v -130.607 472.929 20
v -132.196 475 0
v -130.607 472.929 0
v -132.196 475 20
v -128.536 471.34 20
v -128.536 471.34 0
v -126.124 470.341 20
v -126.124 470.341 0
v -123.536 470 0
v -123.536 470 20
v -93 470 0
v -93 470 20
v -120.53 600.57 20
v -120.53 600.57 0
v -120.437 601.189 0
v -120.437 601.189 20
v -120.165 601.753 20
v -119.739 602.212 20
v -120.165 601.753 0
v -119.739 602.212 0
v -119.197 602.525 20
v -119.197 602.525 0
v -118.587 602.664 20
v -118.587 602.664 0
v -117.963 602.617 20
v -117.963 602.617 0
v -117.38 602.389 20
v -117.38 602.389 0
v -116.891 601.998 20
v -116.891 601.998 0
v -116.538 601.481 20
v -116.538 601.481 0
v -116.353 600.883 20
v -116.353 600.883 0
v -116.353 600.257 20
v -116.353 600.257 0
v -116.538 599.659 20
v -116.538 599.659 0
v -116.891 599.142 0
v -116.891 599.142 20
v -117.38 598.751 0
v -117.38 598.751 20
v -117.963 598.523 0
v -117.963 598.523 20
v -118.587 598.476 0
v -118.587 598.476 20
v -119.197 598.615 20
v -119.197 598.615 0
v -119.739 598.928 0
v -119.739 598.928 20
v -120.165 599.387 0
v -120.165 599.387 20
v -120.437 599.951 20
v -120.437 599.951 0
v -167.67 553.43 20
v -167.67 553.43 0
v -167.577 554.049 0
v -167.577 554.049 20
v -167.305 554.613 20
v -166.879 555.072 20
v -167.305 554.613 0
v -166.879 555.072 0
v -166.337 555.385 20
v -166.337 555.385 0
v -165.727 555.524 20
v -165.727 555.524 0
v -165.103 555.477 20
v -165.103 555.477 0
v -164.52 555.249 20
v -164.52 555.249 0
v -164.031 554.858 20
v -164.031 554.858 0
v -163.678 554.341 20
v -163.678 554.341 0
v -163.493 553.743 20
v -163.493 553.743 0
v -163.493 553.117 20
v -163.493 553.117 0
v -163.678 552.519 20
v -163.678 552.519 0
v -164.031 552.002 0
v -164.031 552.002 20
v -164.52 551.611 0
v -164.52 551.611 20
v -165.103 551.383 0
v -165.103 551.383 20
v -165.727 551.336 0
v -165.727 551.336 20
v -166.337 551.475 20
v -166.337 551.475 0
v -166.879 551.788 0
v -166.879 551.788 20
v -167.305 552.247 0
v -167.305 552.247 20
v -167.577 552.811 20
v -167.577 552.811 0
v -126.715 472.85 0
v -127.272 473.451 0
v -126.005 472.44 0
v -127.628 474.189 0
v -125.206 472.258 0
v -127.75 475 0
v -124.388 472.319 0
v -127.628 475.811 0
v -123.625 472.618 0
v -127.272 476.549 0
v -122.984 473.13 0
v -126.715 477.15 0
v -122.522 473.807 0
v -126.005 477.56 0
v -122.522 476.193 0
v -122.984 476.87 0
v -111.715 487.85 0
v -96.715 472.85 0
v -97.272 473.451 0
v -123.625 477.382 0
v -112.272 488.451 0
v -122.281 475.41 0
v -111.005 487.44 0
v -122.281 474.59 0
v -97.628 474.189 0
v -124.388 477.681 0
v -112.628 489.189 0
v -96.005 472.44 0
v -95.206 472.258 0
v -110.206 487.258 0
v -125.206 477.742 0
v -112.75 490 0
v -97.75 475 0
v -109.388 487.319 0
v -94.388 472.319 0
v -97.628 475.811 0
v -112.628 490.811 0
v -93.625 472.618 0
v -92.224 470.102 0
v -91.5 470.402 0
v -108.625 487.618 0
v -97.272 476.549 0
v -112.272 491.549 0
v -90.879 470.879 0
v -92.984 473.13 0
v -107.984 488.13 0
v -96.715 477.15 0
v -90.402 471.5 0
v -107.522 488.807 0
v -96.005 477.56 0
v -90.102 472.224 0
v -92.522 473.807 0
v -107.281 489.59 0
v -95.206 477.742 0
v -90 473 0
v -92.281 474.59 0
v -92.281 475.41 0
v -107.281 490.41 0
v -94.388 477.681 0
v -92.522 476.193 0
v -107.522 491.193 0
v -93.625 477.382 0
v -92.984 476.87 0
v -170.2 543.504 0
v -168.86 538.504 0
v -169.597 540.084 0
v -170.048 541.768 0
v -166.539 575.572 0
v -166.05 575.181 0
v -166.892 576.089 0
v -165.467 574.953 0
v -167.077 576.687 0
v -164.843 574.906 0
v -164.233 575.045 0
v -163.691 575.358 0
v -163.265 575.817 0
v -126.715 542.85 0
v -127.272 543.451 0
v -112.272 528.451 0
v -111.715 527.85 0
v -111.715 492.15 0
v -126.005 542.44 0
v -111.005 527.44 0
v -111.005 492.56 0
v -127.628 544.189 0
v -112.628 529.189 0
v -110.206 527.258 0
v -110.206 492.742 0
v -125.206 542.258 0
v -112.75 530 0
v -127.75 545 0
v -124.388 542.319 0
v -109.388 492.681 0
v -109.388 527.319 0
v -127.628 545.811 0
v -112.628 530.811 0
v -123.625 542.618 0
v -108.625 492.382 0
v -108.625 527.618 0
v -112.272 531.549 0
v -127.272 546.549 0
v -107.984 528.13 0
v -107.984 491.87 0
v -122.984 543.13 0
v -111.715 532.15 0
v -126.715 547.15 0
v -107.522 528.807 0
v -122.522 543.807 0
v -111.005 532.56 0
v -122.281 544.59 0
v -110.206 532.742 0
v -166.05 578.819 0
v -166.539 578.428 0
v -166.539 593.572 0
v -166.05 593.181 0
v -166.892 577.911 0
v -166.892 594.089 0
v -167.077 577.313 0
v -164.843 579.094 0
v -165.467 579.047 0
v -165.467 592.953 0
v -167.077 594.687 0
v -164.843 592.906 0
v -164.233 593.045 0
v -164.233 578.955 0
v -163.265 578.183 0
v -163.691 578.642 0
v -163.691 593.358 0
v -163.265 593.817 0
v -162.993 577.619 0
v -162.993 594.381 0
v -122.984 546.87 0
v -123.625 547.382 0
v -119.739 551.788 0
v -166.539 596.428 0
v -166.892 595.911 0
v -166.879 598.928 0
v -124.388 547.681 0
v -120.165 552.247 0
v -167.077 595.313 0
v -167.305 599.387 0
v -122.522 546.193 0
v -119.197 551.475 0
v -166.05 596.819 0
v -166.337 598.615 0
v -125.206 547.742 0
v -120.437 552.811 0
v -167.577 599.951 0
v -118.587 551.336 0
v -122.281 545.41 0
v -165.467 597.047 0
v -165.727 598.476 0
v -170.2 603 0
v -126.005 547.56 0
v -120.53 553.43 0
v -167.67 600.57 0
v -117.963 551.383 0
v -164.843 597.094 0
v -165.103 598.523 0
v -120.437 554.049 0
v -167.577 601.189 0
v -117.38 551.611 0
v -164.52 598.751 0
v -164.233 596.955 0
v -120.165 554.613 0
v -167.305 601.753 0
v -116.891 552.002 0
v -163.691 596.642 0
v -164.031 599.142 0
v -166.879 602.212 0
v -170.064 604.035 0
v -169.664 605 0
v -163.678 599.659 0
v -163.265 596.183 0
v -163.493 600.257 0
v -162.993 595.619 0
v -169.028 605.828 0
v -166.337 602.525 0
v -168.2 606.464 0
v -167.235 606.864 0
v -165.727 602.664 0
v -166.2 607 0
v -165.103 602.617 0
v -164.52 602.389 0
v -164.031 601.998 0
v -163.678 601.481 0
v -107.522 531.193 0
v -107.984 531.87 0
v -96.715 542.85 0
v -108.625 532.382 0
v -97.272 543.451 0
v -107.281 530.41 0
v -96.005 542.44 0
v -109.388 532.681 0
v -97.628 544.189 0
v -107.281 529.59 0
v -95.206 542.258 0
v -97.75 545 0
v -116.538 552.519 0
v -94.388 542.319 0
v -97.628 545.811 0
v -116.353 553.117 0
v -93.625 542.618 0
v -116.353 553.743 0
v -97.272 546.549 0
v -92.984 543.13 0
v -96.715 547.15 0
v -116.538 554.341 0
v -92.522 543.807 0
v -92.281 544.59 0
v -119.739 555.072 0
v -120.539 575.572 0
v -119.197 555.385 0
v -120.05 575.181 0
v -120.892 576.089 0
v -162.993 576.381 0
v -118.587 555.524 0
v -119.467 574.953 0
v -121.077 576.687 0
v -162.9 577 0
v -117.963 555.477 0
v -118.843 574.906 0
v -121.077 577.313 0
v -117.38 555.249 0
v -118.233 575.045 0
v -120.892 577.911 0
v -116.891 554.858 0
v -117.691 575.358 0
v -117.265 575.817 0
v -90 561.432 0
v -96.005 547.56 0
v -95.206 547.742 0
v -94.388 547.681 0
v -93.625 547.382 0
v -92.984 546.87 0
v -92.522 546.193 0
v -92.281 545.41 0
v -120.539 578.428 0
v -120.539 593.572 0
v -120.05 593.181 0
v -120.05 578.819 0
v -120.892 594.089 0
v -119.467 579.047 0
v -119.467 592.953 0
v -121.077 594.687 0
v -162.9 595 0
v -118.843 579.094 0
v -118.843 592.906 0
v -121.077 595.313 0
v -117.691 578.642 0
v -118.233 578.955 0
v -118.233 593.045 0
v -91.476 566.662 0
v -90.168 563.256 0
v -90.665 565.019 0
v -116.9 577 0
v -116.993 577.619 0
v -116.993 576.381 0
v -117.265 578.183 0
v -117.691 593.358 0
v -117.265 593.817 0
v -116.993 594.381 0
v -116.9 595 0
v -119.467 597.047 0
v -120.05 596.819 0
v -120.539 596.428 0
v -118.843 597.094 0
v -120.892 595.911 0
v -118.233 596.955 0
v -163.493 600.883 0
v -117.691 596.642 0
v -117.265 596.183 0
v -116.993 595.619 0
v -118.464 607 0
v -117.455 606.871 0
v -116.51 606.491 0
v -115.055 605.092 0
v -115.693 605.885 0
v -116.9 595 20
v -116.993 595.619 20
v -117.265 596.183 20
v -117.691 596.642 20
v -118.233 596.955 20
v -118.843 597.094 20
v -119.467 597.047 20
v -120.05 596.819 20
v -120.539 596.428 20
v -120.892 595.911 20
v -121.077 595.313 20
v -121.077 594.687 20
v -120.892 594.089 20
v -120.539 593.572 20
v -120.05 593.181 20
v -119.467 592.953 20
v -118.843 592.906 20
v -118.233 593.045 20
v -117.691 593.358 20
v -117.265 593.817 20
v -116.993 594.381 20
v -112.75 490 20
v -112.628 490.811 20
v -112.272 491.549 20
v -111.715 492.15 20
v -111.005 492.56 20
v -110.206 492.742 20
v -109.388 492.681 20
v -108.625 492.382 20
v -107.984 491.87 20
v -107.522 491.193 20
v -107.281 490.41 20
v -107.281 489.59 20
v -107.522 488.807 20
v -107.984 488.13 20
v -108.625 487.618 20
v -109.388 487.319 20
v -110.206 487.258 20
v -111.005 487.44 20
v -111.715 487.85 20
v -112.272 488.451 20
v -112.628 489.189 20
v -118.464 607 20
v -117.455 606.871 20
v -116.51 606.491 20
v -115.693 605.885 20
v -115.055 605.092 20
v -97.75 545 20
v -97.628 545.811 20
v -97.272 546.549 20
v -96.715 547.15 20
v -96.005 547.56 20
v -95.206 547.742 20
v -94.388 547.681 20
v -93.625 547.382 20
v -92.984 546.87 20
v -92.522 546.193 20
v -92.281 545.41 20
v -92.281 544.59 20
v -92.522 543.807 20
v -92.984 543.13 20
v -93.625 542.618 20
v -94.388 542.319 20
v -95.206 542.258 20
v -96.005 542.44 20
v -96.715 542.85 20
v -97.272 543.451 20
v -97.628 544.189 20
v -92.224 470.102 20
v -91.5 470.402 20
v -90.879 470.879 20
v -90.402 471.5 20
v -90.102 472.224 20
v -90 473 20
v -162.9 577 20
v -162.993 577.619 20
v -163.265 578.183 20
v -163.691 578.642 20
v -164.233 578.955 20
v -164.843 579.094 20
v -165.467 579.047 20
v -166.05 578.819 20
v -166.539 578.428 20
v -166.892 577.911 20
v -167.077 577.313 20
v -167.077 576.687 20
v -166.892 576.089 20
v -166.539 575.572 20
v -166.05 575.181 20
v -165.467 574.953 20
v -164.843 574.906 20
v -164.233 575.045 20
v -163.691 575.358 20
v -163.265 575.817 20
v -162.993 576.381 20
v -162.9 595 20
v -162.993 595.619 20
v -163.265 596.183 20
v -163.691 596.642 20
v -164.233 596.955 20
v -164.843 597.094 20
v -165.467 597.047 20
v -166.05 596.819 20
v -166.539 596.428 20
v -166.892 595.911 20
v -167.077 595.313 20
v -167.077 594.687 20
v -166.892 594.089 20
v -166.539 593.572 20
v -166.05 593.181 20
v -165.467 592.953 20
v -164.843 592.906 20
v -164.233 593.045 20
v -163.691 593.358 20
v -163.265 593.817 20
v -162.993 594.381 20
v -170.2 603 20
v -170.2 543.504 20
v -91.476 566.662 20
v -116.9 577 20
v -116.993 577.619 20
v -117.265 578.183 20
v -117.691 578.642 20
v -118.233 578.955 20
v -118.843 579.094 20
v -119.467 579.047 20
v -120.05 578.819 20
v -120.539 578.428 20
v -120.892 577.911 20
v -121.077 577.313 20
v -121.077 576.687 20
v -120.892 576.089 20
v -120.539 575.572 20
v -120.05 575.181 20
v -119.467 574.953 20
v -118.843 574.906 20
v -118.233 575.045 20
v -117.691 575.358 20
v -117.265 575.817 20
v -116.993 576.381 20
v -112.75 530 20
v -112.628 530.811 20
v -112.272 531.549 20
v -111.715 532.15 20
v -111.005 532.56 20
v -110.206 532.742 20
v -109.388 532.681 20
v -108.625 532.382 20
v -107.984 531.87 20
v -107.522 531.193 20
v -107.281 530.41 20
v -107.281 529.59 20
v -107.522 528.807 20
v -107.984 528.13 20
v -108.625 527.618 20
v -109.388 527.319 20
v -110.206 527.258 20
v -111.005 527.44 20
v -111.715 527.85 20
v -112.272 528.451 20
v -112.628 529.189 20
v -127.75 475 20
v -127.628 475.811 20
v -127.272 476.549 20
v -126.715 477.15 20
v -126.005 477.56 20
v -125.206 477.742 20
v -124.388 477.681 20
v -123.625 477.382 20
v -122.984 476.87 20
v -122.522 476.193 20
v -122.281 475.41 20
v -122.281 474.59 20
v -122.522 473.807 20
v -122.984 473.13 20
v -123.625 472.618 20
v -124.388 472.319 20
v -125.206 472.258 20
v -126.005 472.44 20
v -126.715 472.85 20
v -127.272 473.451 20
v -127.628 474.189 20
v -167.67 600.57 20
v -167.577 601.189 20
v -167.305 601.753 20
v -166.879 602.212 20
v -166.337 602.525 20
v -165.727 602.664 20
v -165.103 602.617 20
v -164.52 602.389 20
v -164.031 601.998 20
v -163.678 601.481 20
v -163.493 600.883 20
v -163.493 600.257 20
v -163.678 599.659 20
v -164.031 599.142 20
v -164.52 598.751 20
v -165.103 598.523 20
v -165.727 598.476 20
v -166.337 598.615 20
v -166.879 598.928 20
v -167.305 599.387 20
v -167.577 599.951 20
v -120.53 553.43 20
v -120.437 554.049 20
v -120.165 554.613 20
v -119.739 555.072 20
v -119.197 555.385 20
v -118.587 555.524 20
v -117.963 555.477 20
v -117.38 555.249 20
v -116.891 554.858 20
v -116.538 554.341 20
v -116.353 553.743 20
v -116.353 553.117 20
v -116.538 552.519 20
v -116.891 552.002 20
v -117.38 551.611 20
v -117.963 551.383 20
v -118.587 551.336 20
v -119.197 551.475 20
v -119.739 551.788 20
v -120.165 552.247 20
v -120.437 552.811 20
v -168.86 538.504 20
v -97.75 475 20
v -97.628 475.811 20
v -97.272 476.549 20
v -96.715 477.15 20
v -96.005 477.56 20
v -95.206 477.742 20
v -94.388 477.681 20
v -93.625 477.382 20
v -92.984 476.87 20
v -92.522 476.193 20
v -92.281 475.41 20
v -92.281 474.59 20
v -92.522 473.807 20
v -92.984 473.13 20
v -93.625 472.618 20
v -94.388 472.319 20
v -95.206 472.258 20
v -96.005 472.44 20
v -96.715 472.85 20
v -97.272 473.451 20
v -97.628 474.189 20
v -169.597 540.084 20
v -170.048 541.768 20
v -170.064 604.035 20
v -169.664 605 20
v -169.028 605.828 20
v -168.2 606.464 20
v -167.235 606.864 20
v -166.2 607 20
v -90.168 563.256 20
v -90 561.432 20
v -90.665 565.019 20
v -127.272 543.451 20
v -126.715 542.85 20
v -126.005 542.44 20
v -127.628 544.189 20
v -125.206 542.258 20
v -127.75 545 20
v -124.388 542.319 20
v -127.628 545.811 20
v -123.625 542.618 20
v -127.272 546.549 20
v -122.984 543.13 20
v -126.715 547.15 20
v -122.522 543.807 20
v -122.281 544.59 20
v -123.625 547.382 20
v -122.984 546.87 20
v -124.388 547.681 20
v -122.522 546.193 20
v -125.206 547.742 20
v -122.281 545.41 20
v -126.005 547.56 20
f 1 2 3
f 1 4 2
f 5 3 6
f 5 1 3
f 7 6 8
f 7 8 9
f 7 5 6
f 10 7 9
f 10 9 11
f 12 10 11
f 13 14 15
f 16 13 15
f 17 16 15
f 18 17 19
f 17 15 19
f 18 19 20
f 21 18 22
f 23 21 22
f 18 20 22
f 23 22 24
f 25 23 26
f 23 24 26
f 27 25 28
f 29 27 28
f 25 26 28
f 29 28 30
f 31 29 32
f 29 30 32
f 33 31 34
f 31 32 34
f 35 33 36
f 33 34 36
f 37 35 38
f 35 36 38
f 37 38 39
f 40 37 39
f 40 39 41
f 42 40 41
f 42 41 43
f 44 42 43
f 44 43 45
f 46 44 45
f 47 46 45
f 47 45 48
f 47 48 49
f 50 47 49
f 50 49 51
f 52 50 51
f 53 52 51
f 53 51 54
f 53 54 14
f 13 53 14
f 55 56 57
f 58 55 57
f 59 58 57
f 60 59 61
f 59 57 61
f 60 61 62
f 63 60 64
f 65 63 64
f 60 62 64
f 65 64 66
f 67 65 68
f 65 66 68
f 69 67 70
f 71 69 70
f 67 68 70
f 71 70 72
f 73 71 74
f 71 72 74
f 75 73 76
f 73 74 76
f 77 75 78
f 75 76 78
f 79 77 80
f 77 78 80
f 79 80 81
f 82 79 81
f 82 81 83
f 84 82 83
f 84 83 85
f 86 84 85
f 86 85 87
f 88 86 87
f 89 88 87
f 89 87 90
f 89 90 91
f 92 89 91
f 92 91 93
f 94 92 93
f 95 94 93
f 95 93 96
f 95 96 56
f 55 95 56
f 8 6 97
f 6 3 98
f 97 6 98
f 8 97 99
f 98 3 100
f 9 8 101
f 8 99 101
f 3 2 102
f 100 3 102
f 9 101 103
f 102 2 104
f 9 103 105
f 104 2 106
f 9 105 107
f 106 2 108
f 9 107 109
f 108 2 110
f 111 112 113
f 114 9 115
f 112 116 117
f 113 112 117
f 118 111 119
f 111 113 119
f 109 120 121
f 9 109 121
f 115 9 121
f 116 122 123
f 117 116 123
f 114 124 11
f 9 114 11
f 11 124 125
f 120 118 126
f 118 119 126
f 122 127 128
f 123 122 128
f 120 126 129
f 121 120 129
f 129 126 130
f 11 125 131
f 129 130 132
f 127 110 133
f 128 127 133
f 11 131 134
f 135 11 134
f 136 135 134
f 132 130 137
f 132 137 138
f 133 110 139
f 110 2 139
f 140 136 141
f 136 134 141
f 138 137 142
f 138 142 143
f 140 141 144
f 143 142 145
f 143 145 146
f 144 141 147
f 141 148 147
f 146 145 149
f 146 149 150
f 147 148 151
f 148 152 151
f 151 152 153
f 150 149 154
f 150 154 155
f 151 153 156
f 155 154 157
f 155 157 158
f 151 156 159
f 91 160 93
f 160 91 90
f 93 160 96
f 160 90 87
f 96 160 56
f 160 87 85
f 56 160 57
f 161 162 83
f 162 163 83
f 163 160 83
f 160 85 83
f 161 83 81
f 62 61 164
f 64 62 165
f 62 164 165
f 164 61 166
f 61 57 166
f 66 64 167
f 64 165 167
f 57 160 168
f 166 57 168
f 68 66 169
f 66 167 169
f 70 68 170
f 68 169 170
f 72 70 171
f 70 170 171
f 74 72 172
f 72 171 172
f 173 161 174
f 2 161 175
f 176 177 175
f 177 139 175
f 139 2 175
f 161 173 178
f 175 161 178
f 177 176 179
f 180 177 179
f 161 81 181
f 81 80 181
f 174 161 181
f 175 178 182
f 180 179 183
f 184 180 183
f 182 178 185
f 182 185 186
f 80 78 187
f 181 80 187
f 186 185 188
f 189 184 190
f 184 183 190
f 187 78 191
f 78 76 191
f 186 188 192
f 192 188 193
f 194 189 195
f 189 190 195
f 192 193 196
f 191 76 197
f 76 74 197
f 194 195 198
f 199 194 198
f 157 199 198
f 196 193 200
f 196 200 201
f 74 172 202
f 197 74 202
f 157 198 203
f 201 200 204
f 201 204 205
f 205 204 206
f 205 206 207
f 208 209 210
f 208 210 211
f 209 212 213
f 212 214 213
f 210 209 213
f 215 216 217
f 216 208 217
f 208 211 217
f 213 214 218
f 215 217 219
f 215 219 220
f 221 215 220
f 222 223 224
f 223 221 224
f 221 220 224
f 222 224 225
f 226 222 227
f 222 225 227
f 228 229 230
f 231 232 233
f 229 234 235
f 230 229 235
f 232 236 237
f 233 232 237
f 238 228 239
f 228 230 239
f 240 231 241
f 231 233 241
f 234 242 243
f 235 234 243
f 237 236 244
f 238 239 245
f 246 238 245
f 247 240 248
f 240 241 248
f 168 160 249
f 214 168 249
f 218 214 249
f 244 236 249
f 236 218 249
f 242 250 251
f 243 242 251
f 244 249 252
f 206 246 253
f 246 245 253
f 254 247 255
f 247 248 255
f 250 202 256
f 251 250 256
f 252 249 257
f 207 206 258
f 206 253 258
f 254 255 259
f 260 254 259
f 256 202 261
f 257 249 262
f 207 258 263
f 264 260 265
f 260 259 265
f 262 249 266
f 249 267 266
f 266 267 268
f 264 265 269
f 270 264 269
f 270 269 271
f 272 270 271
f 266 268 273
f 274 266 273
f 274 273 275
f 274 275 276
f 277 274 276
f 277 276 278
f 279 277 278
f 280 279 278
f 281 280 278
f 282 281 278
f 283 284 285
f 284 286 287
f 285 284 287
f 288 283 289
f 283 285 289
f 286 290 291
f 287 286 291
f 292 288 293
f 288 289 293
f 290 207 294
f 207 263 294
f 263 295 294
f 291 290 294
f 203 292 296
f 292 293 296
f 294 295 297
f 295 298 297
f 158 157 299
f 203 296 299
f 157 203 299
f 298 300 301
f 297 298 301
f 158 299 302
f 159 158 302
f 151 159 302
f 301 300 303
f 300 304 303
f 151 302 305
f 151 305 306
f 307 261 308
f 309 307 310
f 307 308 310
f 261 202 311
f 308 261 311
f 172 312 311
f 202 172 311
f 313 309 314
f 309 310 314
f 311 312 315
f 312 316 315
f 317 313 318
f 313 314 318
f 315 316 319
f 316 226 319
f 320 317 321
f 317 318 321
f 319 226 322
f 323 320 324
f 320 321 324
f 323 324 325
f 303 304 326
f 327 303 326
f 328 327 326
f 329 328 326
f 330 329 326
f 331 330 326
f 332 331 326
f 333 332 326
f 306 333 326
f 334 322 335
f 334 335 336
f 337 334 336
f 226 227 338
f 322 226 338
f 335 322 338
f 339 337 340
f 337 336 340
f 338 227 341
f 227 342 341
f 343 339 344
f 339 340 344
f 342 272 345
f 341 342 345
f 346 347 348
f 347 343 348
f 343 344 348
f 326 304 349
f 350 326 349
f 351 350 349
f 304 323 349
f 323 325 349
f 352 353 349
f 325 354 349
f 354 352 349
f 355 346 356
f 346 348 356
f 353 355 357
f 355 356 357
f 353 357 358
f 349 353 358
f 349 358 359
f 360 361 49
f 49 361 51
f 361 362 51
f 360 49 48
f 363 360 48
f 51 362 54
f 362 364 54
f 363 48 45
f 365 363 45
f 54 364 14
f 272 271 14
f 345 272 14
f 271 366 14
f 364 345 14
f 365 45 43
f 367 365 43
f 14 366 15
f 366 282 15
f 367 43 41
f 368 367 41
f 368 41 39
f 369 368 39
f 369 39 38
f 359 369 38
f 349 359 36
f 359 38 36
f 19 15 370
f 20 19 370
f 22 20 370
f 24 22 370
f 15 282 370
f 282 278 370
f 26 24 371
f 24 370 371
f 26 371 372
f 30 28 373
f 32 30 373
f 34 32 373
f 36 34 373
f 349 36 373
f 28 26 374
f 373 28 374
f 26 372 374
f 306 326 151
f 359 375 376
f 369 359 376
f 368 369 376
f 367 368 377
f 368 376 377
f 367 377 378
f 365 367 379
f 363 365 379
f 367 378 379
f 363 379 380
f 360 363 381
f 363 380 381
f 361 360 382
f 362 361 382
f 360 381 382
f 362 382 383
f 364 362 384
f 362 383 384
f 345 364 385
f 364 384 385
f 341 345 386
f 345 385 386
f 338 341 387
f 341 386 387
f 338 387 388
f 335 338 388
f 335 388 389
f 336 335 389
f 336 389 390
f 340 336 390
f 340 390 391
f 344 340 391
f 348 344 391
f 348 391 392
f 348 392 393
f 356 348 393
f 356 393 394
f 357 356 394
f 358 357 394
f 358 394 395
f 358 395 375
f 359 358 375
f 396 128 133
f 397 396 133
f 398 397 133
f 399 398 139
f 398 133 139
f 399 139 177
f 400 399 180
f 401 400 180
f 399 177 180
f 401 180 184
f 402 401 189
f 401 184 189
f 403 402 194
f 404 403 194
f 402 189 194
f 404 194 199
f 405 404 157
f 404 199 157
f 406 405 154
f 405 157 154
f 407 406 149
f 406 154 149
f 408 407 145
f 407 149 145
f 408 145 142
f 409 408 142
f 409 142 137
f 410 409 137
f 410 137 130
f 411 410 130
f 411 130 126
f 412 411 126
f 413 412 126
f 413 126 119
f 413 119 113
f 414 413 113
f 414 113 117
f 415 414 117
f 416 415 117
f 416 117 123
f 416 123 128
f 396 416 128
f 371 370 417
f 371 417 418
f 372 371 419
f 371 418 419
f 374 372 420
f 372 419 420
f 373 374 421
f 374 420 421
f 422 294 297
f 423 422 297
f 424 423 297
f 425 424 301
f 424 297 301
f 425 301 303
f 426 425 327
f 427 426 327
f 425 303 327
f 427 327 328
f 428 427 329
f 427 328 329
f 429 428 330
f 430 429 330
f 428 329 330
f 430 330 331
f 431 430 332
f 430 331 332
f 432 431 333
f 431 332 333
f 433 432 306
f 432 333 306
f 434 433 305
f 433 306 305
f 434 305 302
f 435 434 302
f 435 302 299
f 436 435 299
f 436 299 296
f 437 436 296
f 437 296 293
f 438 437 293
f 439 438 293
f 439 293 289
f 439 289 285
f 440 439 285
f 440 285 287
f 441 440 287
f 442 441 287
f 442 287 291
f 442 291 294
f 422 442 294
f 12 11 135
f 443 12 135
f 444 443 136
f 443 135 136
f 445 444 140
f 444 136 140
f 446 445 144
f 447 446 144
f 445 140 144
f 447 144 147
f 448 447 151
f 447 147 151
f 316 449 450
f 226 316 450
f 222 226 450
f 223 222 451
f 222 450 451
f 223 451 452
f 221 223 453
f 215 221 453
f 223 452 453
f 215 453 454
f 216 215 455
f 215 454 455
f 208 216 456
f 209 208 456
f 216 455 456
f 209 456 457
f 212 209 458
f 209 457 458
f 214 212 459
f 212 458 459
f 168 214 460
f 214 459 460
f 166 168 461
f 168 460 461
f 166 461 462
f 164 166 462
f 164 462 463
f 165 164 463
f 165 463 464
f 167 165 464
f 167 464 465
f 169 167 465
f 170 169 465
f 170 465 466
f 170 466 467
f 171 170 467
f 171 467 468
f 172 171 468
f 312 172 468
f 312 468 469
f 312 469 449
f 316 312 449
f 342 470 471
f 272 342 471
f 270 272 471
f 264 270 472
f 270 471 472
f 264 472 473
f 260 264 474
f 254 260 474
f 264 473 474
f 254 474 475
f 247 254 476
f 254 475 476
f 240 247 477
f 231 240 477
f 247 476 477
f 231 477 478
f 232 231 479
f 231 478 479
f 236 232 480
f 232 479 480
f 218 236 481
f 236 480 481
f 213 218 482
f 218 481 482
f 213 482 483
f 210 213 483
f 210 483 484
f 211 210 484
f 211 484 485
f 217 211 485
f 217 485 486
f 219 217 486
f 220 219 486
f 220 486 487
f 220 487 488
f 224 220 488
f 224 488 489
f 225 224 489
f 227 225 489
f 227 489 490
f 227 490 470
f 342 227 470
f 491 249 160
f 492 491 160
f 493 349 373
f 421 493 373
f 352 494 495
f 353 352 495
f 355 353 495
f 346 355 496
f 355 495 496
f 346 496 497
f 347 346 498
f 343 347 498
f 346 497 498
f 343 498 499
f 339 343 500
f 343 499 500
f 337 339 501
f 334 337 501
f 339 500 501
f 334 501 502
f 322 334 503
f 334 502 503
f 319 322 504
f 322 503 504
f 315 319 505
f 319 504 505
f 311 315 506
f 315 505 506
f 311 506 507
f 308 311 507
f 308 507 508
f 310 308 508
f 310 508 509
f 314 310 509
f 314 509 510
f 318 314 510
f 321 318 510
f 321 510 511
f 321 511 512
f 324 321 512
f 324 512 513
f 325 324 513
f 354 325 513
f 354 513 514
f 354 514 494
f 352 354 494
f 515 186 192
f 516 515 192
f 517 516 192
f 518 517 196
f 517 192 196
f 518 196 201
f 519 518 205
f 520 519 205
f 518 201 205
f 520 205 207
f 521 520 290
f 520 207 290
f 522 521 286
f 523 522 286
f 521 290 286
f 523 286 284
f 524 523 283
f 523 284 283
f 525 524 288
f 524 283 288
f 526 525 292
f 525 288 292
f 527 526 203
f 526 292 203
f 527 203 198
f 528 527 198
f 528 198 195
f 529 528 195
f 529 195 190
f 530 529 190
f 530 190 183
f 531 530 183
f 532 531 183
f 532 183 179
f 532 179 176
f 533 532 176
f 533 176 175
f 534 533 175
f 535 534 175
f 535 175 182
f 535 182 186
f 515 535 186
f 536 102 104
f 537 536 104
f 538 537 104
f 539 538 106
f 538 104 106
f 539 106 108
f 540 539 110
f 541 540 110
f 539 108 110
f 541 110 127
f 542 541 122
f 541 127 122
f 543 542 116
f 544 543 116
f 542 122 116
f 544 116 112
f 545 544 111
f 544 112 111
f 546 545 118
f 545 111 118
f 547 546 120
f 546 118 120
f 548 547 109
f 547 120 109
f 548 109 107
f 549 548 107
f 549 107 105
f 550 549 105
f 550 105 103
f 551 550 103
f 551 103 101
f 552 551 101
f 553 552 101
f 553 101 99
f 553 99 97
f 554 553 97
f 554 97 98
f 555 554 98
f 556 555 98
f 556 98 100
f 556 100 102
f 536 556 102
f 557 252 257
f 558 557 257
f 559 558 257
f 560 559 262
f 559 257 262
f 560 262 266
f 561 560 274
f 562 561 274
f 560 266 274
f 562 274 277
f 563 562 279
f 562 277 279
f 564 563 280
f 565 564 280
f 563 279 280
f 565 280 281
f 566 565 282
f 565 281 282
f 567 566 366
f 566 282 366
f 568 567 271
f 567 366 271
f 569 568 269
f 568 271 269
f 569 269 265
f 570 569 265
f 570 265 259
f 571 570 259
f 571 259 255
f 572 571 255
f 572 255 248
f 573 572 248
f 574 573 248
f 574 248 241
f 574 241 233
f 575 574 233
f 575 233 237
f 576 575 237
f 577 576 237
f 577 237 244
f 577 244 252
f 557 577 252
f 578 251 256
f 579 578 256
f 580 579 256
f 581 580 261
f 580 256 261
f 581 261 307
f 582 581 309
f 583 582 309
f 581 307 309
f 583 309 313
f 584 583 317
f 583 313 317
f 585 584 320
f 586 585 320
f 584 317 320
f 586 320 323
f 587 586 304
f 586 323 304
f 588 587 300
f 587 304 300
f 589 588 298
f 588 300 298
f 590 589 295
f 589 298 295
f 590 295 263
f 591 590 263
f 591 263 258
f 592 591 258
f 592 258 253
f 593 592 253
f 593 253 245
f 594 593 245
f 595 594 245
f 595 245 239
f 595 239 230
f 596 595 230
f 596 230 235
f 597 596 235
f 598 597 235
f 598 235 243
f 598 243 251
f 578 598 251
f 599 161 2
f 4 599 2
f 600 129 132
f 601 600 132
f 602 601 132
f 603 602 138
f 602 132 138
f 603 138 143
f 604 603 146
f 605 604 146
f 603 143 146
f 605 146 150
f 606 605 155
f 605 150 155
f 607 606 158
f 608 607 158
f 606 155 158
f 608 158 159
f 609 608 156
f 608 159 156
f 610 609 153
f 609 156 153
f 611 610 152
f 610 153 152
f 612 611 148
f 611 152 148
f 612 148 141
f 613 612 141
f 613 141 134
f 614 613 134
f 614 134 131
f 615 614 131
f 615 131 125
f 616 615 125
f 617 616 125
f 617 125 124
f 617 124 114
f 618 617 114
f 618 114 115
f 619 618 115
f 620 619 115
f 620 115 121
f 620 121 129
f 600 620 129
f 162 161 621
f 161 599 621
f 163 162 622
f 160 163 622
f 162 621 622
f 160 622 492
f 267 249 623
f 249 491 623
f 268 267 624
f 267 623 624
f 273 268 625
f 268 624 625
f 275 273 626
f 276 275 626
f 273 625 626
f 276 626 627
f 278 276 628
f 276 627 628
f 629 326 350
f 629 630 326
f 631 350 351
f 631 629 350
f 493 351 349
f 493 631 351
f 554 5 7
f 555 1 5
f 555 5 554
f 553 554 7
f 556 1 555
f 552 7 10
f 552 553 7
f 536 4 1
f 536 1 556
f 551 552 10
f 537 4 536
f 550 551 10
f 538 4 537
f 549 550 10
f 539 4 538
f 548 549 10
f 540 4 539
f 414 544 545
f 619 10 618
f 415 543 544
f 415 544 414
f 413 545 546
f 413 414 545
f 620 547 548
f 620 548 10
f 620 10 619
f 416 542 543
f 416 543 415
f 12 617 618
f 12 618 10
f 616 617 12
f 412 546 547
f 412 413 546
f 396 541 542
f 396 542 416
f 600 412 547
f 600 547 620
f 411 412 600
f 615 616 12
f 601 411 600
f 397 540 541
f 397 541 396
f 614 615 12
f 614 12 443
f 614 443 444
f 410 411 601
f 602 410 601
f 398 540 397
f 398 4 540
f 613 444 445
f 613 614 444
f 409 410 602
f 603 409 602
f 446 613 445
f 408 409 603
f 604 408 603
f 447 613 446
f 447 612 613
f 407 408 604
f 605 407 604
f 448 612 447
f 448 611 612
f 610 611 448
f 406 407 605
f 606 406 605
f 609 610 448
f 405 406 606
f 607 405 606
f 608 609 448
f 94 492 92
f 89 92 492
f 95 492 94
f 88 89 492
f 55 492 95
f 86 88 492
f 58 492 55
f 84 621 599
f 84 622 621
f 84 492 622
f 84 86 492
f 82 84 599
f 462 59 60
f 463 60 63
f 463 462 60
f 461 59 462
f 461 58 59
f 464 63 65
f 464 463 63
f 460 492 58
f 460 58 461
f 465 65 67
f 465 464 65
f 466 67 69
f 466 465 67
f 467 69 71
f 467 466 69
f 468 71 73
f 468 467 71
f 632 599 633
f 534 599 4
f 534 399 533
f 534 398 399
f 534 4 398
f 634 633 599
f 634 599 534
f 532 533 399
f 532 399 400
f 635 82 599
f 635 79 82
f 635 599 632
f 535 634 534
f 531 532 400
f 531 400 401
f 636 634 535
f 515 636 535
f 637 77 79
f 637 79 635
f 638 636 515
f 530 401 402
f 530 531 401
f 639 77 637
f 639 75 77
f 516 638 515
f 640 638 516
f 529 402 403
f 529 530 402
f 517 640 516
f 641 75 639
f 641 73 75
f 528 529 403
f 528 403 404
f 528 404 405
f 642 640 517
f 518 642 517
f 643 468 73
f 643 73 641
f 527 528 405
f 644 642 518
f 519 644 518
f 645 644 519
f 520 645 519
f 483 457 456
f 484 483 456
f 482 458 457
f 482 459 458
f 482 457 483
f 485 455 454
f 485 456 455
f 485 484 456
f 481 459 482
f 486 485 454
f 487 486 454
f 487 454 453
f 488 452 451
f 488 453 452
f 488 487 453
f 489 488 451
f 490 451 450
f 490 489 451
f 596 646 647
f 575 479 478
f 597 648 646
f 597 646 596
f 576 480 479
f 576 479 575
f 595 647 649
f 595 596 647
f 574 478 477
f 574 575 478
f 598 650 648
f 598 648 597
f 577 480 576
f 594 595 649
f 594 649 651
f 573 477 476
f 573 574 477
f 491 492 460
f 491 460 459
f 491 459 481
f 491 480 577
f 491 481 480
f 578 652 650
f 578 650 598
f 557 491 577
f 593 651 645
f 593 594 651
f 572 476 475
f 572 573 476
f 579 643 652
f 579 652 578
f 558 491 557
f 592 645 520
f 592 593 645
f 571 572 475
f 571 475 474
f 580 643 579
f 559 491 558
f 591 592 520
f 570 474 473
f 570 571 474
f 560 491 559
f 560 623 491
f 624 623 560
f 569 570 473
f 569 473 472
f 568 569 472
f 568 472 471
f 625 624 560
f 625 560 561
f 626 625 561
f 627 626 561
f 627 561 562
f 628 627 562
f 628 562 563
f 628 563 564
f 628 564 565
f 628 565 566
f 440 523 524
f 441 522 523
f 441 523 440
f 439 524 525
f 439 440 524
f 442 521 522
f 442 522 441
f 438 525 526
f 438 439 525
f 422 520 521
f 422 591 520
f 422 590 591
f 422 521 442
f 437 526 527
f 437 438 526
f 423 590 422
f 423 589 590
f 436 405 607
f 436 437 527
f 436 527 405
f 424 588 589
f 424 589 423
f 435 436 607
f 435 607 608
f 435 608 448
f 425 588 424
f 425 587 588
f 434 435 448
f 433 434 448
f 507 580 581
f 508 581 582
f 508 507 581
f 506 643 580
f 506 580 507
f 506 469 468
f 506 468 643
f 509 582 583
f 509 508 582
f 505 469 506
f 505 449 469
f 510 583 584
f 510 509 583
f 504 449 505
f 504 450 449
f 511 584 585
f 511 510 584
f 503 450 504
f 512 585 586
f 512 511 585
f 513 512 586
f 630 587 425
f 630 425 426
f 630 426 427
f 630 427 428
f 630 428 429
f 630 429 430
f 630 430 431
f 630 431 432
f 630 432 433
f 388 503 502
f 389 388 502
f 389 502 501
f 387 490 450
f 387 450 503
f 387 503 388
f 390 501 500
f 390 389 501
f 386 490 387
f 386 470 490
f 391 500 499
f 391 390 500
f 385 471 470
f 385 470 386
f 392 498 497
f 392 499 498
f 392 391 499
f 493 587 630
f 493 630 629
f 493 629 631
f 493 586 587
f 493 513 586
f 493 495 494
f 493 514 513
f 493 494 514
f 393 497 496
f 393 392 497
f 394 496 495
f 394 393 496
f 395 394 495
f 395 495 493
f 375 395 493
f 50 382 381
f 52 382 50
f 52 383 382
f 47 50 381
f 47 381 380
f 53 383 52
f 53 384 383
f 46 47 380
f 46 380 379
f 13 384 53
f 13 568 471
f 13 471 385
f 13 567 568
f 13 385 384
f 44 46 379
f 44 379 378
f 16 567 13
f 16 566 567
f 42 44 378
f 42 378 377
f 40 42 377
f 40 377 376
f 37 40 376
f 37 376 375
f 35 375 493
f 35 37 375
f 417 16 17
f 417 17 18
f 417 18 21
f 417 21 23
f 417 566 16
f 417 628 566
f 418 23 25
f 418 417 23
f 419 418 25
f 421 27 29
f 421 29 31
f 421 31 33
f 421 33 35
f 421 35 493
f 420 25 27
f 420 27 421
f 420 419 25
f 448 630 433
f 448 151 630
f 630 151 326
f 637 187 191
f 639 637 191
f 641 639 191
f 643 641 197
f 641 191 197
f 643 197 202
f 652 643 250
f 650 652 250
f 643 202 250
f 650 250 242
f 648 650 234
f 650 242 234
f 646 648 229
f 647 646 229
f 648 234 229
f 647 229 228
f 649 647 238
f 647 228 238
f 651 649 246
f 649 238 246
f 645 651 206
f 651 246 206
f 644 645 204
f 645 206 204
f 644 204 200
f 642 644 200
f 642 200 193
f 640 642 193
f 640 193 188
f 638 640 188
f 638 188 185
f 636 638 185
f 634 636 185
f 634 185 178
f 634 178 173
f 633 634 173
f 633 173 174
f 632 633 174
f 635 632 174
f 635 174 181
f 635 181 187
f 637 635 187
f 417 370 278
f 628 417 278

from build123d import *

# Parameters (mm, degrees)
BOSS_EXTRUDE1_DEPTH     = 20
FILLET1_R               = 10
TAP_DRILL_FOR_M5_TAP1_D = 4.2
M5_CLEARANCE_HOLE1_D    = 5.5
TAP_DRILL_FOR_M5_TAP2_D = 4.2
FILLET2_R               = 4


with BuildPart() as part:
    # Sketch1 → Boss-Extrude1 (new body)
    with BuildSketch(Plane.XY):
        with BuildLine():
            Line((-170.200000001, 540.824594888), (-129.309401077, 470))
            Line((-129.309401077, 470), (-93, 470))
            ThreePointArc((-93, 470), (-90.878679656, 470.878679656), (-90, 473))
            Line((-90, 473), (-90, 564.25527297))
            Line((-90, 564.25527297), (-116.225329238, 607))
            Line((-116.225329238, 607), (-170.200000001, 607))
            Line((-170.200000001, 607), (-170.200000001, 540.824594888))
        make_face()
    extrude(amount=BOSS_EXTRUDE1_DEPTH)

    # Fillet1
    fillet1_edges = [part.edges().sort_by_distance(p)[0] for p in [
        (-90, 564.25527297, 10),
        (-129.309401077, 470, 10),
        (-170.200000001, 540.824594888, 10),
    ]]
    fillet(fillet1_edges, radius=FILLET1_R)

    # Tap Drill for M5 Tap1 (through all)
    with Locations(Plane(origin=(0, 0, 0), x_dir=(-1, 0, 0), z_dir=(0, 0, -1))):
        with Locations((119.000000001, 595), (119.000000001, 577), (165.000000001, 577), (165.000000001, 595)):
            Hole(TAP_DRILL_FOR_M5_TAP1_D / 2)

    # M5 Clearance Hole1 (through all)
    with Locations(Plane.XY.offset(20)):
        with Locations((-95, 545), (-125, 545), (-125, 475), (-95, 475), (-110, 490), (-110, 530)):
            Hole(M5_CLEARANCE_HOLE1_D / 2)

    # Tap Drill for M5 Tap2 (through all)
    with Locations(Plane.XY.offset(20)):
        with Locations((-165.570000001, 553.43), (-165.570000001, 600.57), (-118.430000001, 553.43), (-118.430000001, 600.57)):
            Hole(TAP_DRILL_FOR_M5_TAP2_D / 2)

    # Fillet2
    fillet2_edges = [part.edges().sort_by_distance(p)[0] for p in [
        (-116.225329238, 607, 10),
        (-170.200000001, 607, 10),
    ]]
    fillet(fillet2_edges, radius=FILLET2_R)


solid = part.part
